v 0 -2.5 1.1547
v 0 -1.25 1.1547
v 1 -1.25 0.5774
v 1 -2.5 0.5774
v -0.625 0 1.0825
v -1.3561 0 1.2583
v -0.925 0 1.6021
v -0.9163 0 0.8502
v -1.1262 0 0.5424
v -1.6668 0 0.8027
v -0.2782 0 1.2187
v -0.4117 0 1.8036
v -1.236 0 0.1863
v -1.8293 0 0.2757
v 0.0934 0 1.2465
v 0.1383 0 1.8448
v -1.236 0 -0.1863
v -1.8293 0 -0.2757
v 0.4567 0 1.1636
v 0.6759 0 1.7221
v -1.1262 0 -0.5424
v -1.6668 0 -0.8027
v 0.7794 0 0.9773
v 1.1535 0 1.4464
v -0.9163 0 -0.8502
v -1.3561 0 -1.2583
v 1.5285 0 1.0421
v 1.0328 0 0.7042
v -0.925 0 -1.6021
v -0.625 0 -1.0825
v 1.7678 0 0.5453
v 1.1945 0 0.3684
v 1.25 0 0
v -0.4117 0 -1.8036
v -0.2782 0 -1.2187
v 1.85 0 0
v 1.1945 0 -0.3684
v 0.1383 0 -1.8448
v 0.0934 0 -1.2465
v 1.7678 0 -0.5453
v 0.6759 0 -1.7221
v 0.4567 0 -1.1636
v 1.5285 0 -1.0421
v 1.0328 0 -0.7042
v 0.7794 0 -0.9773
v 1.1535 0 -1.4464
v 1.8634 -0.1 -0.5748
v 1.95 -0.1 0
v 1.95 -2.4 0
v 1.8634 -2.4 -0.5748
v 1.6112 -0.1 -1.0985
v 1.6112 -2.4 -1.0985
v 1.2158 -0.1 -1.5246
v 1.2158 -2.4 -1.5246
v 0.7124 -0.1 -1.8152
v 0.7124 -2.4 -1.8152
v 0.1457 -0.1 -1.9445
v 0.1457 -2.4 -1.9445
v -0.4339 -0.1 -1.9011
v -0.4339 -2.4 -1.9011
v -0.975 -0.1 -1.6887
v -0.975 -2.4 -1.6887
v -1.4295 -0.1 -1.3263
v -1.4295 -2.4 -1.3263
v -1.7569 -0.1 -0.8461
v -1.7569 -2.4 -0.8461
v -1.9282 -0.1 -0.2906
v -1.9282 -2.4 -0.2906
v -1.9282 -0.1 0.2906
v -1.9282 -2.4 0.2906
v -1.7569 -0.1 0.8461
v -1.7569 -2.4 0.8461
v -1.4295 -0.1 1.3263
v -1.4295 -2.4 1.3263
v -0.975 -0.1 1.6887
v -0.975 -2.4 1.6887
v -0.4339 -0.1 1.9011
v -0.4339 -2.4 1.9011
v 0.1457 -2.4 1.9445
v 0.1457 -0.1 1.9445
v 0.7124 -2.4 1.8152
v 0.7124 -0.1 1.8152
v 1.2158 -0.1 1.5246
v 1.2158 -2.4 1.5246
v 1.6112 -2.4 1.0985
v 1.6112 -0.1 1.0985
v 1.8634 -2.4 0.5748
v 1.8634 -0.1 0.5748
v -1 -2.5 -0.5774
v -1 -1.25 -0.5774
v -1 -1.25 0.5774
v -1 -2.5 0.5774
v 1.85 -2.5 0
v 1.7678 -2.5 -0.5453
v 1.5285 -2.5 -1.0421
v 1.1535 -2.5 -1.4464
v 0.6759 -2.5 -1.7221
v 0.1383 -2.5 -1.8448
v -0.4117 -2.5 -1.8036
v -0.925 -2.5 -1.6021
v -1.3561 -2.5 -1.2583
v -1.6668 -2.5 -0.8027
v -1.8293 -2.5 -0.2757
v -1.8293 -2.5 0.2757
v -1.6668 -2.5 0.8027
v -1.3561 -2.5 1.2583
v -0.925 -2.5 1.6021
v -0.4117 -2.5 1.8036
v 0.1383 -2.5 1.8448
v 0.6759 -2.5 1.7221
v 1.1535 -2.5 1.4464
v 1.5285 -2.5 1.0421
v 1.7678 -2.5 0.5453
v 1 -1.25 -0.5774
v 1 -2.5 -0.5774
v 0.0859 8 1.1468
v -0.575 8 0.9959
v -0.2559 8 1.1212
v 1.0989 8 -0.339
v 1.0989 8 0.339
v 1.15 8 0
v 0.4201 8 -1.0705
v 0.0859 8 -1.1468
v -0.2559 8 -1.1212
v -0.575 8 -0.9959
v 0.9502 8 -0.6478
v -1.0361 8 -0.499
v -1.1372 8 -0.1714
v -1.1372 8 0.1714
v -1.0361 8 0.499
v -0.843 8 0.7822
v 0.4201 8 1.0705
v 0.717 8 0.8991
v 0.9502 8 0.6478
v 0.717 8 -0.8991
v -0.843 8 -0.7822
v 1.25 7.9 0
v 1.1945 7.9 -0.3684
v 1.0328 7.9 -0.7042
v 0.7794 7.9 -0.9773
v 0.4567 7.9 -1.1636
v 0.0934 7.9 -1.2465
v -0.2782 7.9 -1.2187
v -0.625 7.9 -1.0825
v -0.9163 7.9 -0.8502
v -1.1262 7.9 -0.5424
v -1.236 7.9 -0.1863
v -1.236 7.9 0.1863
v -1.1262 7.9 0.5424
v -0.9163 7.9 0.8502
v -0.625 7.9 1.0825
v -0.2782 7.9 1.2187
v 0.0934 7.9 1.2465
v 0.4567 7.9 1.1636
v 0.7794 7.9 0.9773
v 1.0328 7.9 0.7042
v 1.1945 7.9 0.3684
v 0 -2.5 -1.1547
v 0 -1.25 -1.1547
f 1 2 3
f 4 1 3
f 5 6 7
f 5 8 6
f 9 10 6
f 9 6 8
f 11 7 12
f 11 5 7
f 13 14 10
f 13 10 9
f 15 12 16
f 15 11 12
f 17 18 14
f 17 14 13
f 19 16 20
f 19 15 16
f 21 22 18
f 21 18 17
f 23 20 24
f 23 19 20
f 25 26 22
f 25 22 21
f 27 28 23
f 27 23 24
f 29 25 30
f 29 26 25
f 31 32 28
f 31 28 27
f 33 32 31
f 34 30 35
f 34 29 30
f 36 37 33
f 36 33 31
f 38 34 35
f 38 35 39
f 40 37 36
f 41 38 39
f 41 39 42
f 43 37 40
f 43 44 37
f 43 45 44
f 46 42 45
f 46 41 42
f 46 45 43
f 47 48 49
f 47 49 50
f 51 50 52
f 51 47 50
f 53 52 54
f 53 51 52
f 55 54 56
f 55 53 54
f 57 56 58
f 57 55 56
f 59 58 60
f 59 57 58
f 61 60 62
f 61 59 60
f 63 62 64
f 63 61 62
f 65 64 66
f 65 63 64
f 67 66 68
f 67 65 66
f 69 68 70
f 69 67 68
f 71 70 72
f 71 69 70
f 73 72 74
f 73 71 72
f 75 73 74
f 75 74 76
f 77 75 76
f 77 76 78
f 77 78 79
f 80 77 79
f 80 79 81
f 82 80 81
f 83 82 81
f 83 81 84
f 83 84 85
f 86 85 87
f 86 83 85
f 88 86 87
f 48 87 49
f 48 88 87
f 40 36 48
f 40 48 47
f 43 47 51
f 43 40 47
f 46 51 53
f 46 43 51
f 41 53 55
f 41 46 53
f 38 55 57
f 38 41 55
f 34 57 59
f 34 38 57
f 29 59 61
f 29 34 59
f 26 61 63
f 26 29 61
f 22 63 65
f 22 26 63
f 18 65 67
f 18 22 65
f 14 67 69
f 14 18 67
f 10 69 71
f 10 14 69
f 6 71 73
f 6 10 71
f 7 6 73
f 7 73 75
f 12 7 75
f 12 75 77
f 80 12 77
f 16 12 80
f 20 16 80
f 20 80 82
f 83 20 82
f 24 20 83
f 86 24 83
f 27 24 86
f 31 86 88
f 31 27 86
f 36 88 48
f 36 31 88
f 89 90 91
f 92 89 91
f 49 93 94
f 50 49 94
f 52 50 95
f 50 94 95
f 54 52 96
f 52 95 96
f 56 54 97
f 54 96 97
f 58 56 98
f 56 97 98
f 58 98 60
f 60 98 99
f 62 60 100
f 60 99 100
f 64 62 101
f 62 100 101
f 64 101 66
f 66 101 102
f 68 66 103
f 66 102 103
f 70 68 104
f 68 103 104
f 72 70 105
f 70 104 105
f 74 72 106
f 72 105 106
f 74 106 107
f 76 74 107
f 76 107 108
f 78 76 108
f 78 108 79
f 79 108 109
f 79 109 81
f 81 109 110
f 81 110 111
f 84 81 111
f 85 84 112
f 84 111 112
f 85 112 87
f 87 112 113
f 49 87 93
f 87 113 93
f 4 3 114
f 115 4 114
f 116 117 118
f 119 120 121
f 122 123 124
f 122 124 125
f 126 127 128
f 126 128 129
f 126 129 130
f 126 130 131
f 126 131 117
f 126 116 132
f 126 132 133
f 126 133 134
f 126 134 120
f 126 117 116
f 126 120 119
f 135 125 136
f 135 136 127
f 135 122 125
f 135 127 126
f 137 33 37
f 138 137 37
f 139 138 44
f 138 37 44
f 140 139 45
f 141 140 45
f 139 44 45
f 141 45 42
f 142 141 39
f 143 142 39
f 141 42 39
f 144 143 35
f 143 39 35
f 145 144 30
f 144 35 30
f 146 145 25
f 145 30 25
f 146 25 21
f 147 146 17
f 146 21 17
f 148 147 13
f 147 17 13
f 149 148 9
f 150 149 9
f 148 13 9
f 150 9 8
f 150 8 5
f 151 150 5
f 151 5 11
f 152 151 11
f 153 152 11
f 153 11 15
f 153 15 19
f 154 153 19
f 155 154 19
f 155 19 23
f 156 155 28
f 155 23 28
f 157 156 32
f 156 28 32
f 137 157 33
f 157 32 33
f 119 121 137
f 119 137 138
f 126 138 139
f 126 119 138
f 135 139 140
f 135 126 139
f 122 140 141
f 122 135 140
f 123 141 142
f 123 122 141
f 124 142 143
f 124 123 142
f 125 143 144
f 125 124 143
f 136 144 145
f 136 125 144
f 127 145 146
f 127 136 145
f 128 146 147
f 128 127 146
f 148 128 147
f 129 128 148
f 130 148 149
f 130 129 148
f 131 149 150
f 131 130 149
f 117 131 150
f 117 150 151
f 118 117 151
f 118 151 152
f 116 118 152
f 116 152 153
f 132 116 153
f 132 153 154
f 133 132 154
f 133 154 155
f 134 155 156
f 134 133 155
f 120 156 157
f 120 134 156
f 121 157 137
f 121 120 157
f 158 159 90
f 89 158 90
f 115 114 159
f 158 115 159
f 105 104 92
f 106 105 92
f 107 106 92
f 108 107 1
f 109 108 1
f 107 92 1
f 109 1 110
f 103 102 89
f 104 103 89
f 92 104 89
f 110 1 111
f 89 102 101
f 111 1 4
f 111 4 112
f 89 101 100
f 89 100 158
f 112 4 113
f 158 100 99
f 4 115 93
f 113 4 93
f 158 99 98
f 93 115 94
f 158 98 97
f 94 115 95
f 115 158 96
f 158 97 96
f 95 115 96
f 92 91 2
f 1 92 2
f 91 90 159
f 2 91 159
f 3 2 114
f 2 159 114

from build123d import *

# Parameters (mm, degrees)
SKETCH_1_R          = 1.95
EXTRUDE_1_DEPTH     = 2.5
SKETCH_1_3_R        = 1.25
EXTRUDE_2_DEPTH     = 8
CUT_EXTRUDE_START   = -1.25
CUT_EXTRUDE_1_DEPTH = 8.211973765
CHAMFER_1_SIZE      = 0.1


with BuildPart() as part:
    # Эскиз1 → Бобышка-Вытянуть1 (new body)
    with BuildSketch(Plane(origin=(0, 0, 0), x_dir=(1, 0, 0), z_dir=(0, 1, 0))):
        Circle(SKETCH_1_R)
    extrude(amount=-EXTRUDE_1_DEPTH)

    # Эскиз1<3> → Бобышка-Вытянуть2 (add)
    with BuildSketch(Plane(origin=(0, 0, 0), x_dir=(1, 0, 0), z_dir=(0, 1, 0))):
        Circle(SKETCH_1_3_R)
    extrude(amount=EXTRUDE_2_DEPTH)

    # Эскиз1<6> → Вырез-Вытянуть1 (cut, through all)
    with BuildSketch(Plane(origin=(0, 0, 0), x_dir=(1, 0, 0), z_dir=(0, 1, 0)).offset(CUT_EXTRUDE_START)):
        Polygon((0, 1.154700538), (-1, 0.577350269), (-1, -0.577350269), (0, -1.154700538), (1, -0.577350269), (1, 0.577350269), align=None)
    extrude(amount=-CUT_EXTRUDE_1_DEPTH, mode=Mode.SUBTRACT)

    # Фаска1
    chamfer_1_edges = [part.edges().sort_by_distance(p)[0] for p in [
        (-1.25, 8, 0),
        (-1.95, 0, 0),
        (-1.95, -2.5, 0),
    ]]
    chamfer(chamfer_1_edges, length=CHAMFER_1_SIZE)


solid = part.part
